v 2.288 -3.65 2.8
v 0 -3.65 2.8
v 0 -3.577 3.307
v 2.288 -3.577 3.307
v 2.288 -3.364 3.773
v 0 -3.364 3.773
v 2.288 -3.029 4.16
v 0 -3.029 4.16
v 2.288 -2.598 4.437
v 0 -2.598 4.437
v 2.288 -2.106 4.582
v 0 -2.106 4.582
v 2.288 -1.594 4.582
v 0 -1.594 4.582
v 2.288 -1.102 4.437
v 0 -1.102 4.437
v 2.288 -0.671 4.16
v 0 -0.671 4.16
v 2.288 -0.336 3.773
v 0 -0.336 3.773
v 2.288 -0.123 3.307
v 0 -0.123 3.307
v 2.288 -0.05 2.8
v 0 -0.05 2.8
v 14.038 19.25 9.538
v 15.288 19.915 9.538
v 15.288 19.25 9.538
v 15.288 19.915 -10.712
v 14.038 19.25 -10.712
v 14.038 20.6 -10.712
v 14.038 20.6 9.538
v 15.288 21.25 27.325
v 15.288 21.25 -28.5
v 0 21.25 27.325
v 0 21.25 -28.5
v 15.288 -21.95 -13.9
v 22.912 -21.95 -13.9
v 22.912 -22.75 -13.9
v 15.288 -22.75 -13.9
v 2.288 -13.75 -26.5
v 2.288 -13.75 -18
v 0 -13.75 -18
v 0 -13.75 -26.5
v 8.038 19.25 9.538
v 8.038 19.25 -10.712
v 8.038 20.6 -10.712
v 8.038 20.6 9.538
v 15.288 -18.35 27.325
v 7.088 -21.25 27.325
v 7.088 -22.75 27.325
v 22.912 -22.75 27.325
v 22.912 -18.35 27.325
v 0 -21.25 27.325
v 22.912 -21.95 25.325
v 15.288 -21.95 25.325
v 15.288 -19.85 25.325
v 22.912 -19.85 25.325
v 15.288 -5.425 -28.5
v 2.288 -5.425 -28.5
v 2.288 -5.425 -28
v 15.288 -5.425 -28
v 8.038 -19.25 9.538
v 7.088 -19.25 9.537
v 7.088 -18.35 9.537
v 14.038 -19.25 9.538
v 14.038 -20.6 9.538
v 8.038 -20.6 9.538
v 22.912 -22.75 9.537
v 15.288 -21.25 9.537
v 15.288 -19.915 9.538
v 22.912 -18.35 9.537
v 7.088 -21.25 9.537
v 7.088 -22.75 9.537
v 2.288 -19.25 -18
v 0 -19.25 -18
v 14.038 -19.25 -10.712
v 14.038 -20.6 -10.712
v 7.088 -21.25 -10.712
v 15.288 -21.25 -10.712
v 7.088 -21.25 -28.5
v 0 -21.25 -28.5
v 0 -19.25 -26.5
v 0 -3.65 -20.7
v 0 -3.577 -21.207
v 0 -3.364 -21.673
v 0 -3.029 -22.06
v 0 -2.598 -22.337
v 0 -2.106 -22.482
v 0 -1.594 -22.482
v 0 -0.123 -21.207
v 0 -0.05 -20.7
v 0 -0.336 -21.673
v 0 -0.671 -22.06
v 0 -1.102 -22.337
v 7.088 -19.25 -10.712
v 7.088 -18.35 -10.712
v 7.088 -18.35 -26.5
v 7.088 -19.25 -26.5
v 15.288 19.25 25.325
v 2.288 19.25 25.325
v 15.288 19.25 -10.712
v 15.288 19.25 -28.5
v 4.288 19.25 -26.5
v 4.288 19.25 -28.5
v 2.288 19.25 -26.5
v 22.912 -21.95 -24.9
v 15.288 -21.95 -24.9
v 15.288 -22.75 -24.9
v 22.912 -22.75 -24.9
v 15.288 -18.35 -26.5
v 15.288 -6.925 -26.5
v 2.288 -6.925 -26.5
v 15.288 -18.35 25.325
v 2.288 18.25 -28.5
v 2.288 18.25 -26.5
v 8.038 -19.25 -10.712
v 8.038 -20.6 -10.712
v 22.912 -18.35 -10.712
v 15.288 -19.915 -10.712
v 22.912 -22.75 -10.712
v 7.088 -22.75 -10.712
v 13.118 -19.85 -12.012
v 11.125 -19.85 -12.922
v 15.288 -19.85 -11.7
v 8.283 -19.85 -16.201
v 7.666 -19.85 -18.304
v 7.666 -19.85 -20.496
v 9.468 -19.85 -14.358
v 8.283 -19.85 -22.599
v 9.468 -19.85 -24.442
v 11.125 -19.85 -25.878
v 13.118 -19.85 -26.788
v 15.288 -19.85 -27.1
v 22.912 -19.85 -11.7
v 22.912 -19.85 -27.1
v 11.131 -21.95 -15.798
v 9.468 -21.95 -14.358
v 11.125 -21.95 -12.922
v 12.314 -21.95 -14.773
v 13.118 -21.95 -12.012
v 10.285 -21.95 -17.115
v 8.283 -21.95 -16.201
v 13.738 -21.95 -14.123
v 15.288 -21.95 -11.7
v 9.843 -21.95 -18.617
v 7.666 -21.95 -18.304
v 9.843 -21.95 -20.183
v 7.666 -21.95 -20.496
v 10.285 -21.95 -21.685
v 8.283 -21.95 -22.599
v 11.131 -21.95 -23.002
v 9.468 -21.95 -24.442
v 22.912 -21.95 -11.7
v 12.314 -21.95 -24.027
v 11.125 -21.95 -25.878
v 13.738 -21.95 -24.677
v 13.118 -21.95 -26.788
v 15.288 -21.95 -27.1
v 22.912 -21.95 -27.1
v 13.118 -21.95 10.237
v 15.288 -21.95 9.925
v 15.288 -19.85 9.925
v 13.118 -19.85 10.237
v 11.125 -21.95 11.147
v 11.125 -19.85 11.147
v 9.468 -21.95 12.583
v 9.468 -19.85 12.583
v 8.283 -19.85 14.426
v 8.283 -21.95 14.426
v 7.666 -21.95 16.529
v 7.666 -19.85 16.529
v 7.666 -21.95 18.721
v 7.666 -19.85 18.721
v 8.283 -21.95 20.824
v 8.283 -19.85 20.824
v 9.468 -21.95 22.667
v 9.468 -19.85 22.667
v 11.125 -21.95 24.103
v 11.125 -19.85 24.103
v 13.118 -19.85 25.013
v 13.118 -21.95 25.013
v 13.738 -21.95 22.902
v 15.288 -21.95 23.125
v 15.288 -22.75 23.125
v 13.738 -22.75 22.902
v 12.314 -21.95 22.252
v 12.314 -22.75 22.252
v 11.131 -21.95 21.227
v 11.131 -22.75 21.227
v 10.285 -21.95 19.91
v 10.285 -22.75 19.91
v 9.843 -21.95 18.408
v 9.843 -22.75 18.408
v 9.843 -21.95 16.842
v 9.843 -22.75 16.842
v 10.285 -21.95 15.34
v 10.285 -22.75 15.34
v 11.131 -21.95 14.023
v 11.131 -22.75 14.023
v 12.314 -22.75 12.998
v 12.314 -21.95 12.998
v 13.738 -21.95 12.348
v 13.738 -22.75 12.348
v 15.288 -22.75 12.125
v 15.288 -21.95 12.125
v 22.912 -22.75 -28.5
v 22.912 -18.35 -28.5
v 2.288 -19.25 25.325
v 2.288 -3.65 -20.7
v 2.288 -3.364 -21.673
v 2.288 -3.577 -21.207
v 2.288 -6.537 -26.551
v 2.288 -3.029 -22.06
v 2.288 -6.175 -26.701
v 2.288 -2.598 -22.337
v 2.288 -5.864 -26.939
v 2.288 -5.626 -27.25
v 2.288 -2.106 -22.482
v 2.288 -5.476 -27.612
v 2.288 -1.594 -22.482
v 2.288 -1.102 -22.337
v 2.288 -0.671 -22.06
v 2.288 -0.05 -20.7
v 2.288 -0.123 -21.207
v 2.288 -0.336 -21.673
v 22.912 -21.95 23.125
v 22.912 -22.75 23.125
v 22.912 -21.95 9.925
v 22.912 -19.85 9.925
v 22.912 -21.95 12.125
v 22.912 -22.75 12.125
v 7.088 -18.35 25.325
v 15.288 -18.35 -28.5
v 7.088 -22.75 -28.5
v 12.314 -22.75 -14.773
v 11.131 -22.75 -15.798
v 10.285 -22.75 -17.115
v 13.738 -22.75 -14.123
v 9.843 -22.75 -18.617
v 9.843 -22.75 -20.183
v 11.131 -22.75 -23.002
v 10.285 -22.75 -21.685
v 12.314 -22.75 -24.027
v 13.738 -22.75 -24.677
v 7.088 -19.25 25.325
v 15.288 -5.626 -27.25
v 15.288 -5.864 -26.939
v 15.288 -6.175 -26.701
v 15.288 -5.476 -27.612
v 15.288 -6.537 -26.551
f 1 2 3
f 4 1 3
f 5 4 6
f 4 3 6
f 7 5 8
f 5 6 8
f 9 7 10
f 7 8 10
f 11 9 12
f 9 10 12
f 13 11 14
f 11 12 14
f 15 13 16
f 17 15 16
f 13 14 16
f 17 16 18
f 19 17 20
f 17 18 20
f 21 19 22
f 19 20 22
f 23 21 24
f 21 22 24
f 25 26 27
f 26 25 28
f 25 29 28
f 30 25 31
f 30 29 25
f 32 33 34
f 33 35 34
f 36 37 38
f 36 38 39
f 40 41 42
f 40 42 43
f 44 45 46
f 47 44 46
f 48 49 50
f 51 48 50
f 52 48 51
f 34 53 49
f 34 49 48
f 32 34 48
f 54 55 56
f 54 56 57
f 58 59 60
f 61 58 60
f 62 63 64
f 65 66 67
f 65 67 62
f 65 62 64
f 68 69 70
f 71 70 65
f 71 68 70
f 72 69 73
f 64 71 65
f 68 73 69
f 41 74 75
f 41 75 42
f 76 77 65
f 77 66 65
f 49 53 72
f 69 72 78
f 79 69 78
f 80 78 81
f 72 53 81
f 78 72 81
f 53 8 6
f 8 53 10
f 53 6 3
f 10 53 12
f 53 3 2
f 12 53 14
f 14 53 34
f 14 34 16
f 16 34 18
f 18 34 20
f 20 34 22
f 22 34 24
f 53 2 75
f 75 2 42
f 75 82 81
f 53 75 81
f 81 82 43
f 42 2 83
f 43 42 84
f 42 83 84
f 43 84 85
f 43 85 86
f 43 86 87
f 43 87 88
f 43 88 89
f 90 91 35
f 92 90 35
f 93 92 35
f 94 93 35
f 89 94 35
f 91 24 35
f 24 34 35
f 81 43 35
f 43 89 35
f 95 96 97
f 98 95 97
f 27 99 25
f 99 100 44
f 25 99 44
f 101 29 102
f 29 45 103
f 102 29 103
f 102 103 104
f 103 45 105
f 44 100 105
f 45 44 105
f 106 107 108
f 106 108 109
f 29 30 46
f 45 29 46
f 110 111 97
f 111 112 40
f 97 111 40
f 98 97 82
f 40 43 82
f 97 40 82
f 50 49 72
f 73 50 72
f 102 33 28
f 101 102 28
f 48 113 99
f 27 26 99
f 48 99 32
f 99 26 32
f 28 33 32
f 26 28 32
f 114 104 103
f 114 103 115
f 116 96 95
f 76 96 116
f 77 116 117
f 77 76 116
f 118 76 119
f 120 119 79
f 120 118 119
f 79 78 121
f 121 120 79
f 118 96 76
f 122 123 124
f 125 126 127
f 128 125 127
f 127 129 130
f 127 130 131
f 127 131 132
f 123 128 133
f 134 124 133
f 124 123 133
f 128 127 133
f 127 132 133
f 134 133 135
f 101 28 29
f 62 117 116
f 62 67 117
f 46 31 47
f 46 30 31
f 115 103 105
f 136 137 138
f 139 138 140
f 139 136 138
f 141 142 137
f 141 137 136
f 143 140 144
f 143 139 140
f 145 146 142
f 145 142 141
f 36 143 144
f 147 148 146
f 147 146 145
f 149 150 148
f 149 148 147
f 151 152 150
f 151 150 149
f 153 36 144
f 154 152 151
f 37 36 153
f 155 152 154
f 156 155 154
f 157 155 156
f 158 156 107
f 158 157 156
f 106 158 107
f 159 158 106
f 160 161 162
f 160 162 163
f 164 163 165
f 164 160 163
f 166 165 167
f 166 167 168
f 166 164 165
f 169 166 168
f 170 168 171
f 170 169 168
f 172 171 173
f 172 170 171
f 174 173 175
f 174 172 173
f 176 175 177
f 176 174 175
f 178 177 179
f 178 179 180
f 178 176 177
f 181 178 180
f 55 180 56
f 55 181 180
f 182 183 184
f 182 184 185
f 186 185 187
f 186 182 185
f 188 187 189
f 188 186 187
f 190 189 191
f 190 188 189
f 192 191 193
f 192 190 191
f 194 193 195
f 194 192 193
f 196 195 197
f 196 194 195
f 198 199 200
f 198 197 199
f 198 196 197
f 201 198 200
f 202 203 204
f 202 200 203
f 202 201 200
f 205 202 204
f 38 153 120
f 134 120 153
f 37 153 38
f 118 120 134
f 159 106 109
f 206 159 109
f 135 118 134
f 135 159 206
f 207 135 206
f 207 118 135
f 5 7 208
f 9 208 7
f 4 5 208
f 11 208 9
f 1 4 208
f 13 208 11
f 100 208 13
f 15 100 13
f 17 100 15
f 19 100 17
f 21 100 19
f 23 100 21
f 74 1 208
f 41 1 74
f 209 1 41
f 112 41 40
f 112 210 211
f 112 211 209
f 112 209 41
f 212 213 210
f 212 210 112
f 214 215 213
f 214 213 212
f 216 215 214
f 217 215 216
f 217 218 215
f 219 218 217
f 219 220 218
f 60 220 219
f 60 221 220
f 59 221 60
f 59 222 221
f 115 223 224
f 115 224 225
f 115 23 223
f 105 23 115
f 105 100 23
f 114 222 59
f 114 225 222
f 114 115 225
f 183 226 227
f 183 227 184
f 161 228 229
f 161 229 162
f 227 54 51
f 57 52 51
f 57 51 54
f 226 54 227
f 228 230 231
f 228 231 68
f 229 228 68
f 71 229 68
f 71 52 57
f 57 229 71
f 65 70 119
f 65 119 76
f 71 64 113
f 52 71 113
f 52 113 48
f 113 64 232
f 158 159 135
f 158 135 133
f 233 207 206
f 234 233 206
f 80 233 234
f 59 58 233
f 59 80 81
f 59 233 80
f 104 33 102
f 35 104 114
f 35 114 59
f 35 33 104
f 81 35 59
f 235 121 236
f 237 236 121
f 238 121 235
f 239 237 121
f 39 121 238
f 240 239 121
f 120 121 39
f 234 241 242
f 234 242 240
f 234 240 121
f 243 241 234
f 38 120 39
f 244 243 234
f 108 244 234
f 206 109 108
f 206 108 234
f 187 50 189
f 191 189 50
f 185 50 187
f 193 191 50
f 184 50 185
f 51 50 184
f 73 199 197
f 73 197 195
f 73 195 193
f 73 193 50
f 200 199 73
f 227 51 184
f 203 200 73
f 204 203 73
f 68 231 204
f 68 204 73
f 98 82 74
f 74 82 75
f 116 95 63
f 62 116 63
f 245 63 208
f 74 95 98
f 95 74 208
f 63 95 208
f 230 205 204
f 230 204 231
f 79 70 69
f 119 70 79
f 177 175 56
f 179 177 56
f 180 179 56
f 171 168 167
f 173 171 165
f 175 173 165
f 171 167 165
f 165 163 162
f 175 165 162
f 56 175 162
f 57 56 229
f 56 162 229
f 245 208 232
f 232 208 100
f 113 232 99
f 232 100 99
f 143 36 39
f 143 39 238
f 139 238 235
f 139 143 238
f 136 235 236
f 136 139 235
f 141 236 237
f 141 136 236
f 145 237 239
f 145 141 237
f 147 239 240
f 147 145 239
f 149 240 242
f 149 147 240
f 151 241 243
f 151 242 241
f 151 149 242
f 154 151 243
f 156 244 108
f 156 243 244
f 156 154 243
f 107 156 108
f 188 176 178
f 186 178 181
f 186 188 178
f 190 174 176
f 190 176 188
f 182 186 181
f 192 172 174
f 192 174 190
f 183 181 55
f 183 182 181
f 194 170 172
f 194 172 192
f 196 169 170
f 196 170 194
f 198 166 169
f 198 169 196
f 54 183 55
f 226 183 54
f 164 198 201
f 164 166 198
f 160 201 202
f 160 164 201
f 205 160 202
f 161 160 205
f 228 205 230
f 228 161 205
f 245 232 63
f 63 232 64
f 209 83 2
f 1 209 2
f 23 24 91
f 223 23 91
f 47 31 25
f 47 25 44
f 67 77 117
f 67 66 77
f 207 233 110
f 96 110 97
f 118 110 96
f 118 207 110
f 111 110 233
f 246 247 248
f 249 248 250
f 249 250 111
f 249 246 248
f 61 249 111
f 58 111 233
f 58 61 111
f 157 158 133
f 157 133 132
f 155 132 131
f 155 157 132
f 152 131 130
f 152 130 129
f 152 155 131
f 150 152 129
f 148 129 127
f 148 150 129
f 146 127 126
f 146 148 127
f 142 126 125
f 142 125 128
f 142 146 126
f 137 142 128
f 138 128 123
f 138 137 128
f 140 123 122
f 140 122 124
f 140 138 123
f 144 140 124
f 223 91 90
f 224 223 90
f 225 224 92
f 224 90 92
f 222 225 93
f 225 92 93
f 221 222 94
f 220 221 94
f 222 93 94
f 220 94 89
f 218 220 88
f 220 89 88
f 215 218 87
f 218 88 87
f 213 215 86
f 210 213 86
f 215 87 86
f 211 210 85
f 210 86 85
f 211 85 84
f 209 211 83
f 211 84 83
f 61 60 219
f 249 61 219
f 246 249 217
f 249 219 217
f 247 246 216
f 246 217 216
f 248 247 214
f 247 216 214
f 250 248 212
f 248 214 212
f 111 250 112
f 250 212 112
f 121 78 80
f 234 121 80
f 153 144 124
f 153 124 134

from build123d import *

# Parameters (mm, degrees)
MAIN_EXTRUDE_DEPTH          = 2.2875
WALLS_START                 = 2.2875
WALLS_DEPTH                 = 13
CORNER_SUPPORT_DEPTH        = 2
FILLET4_R                   = 2
SKETCH4_W                   = 8.5
SKETCH4_H                   = 5.5
WIRE_HOLE_DEPTH             = 40.380356778
SKETCH25_W                  = 6
SKETCH25_H                  = 1.35
FEMALE_SNAP_DEPTH           = 10.125
SKETCH30_W                  = 15.7875
SKETCH30_H                  = 0.9
SKETCH30_W_2                = 17.7875
SKETCH30_H_2                = 1.5
MAGNET_EXTRUDE_1_DEPTH      = 7.625
MAGNET_EXTRUDE_1_DEPTH_BACK = 8.2
SKETCH29_R                  = 7.7
MAGNET_HOLE_DEPTH           = 2.1
SKETCH31_R                  = 5.5
MAGNET_THRU_HOLE_DEPTH      = 58.632218908
SKETCH40_W                  = 15.2875
SKETCH40_H                  = 12.55
CUT_EXTRUDE2_DEPTH          = 6
SKETCH41_W                  = 13
SKETCH41_H                  = 2
BOSS_EXTRUDE1_DEPTH         = 9.4


with BuildPart() as part:
    # Sketch1 → Main Extrude (new body)
    with BuildSketch(Plane(origin=(0, 0, 0), x_dir=(0, 0, -1), z_dir=(1, 0, 0))):
        Polygon((-30.5, -9.35), (-27.325, -9.35), (-27.325, -21.25), (28.5, -21.25), (28.5, 21.25), (-27.325, 21.25), (-27.325, 3.2), (-30.5, 3.2), align=None)
        with BuildLine():
            Line((20.7, -3.65), (-2.8, -3.65))
            ThreePointArc((-2.8, -3.65), (-4.6, -1.85), (-2.8, -0.05))
            Line((-2.8, -0.05), (20.7, -0.05))
            ThreePointArc((20.7, -0.05), (22.5, -1.85), (20.7, -3.65))
        make_face(mode=Mode.SUBTRACT)
    extrude(amount=MAIN_EXTRUDE_DEPTH)

    # Sketch1_3 → Walls (add)
    with BuildSketch(Plane(origin=(0, 0, 0), x_dir=(0, 0, -1), z_dir=(1, 0, 0)).offset(WALLS_START)):
        Polygon((-25.325, 19.25), (28.5, 19.25), (28.5, 21.25), (-27.325, 21.25), (-27.325, 3.2), (-30.5, 3.2), (-30.5, 1.3), (-25.325, 1.3), align=None)
        with BuildLine():
            Line((28.5, -5.425), (28, -5.425))
            ThreePointArc((28, -5.425), (26.939339828, -5.864339828), (26.5, -6.925))
            Line((26.5, -6.925), (26.5, -19.25))
            Line((26.5, -19.25), (-25.325, -19.25))
            Line((-25.325, -19.25), (-25.325, -8.1))
            Line((-25.325, -8.1), (-28.5, -8.1))
            Line((-28.5, -8.1), (-28.5, -4.45))
            Line((-28.5, -4.45), (-30.5, -4.45))
            Line((-30.5, -4.45), (-30.5, -9.35))
            Line((-30.5, -9.35), (-27.325, -9.35))
            Line((-27.325, -9.35), (-27.325, -21.25))
            Line((-27.325, -21.25), (28.5, -21.25))
            Line((28.5, -21.25), (28.5, -5.425))
        make_face()
    extrude(amount=WALLS_DEPTH)

    # Sketch22 → Corner Support (add)
    with BuildSketch(Plane(origin=(0, 0, -28.5), x_dir=(-1, 0, 0), z_dir=(0, 0, -1))):
        Polygon((-4.2875, 19.25), (-2.2875, 18.25), (-2.2875, 19.25), align=None)
    extrude(amount=-CORNER_SUPPORT_DEPTH)

    # Fillet4
    fillet4_edges = [part.edges().sort_by_distance(p)[0] for p in [
        (2.2875, -1.575, 30.5),
    ]]
    fillet(fillet4_edges, radius=FILLET4_R)

    # Sketch4 → Wire Hole (cut, through all)
    with BuildSketch(Plane(origin=(2.2875, 0, 0), x_dir=(0, 0, -1), z_dir=(1, 0, 0))):
        with Locations((22.25, -16.5)):
            Rectangle(SKETCH4_W, SKETCH4_H)
    extrude(amount=-WIRE_HOLE_DEPTH, mode=Mode.SUBTRACT)

    # Sketch25 → Female Snap (cut, symmetric)
    with BuildSketch(Plane(origin=(0, 0, -0.5875), x_dir=(-1, 0, 0), z_dir=(0, 0, -1))):
        with Locations((-11.0375, -19.925)):
            Rectangle(SKETCH25_W, SKETCH25_H)
        Polygon((-15.2875, -19.25), (-15.2875, -19.91463679), (-14.0375, -19.25), align=None)
        with Locations((-11.0375, 19.925)):
            Rectangle(SKETCH25_W, SKETCH25_H)
        Polygon((-15.2875, 19.91463679), (-15.2875, 19.25), (-14.0375, 19.25), align=None)
    extrude(amount=FEMALE_SNAP_DEPTH, both=True, mode=Mode.SUBTRACT)

    # Sketch30 → Magnet Extrude 1 (add, two sides)
    with BuildSketch(Plane(origin=(15.2875, 0, 0), x_dir=(0, 0, -1), z_dir=(1, 0, 0))) as magnet_extrude_1_sk:
        Polygon((-27.325, -18.35), (-27.325, -21.25), (-9.5375, -21.25), (-9.5375, -19.91463679), (-9.5375, -19.25), (-25.325, -19.25), (-25.325, -18.35), align=None)
        with Locations((-17.43125, -18.8)):
            Rectangle(SKETCH30_W, SKETCH30_H)
        with Locations((19.60625, -22)):
            Rectangle(SKETCH30_W_2, SKETCH30_H_2)
        Polygon((10.7125, -19.91463679), (10.7125, -21.25), (28.5, -21.25), (28.5, -18.35), (26.5, -18.35), (26.5, -19.25), (10.7125, -19.25), align=None)
        with Locations((-18.43125, -22)):
            Rectangle(SKETCH30_W_2, SKETCH30_H_2)
        with Locations((18.60625, -18.8)):
            Rectangle(SKETCH30_W, SKETCH30_H)
    extrude(amount=MAGNET_EXTRUDE_1_DEPTH)
    extrude(magnet_extrude_1_sk.sketch, amount=-MAGNET_EXTRUDE_1_DEPTH_BACK)

    # Sketch29 → Magnet Hole (cut)
    with BuildSketch(Plane(origin=(0, -21.95, 0), x_dir=(1, 0, 0), z_dir=(0, 1, 0))):
        with Locations((15.2875, -17.625)):
            Circle(SKETCH29_R)
        with BuildLine():
            ThreePointArc((22.9125, -18.697089082), (20.338980677, -23.436414885), (15.2875, -25.325))
            Line((15.2875, -25.325), (22.9125, -25.325))
            Line((22.9125, -25.325), (22.9125, -18.697089082))
        make_face()
        with BuildLine():
            Line((22.9125, -9.925), (15.2875, -9.925))
            ThreePointArc((15.2875, -9.925), (20.338980677, -11.813585115), (22.9125, -16.552910918))
            Line((22.9125, -16.552910918), (22.9125, -9.925))
        make_face()
        with Locations((15.2875, 19.4)):
            Circle(SKETCH29_R)
        with BuildLine():
            ThreePointArc((22.9125, 18.327910918), (20.338980677, 13.588585115), (15.2875, 11.7))
            Line((15.2875, 11.7), (22.9125, 11.7))
            Line((22.9125, 11.7), (22.9125, 18.327910918))
        make_face()
        with BuildLine():
            Line((22.9125, 27.1), (15.2875, 27.1))
            ThreePointArc((15.2875, 27.1), (20.338980677, 25.211414885), (22.9125, 20.472089082))
            Line((22.9125, 20.472089082), (22.9125, 27.1))
        make_face()
        with BuildLine():
            ThreePointArc((22.9875, -17.625), (22.968727116, -17.087645368), (22.9125, -16.552910918))
            Line((22.9125, -16.552910918), (22.9125, -18.697089082))
            ThreePointArc((22.9125, -18.697089082), (22.968727116, -18.162354632), (22.9875, -17.625))
        make_face()
        with BuildLine():
            Line((22.9125, 20.472089082), (22.9125, 18.327910918))
            ThreePointArc((22.9125, 18.327910918), (22.968727116, 18.862645368), (22.9875, 19.4))
            ThreePointArc((22.9875, 19.4), (22.968727116, 19.937354632), (22.9125, 20.472089082))
        make_face()
    extrude(amount=MAGNET_HOLE_DEPTH, mode=Mode.SUBTRACT)

    # Sketch31 → Magnet Thru Hole (cut, through all)
    with BuildSketch(Plane.XZ.offset(21.95)):
        with Locations((15.2875, 17.625)):
            Circle(SKETCH31_R)
        with BuildLine():
            Line((22.9125, 23.125), (15.2875, 23.125))
            ThreePointArc((15.2875, 23.125), (19.176587297, 21.514087297), (20.7875, 17.625))
            ThreePointArc((20.7875, 17.625), (19.176587297, 13.735912703), (15.2875, 12.125))
            Line((15.2875, 12.125), (22.9125, 12.125))
            Line((22.9125, 12.125), (22.9125, 23.125))
        make_face()
        with Locations((15.2875, -19.4)):
            Circle(SKETCH31_R)
        with BuildLine():
            Line((22.9125, -13.9), (15.2875, -13.9))
            ThreePointArc((15.2875, -13.9), (19.176587297, -15.510912703), (20.7875, -19.4))
            ThreePointArc((20.7875, -19.4), (19.176587297, -23.289087297), (15.2875, -24.9))
            Line((15.2875, -24.9), (22.9125, -24.9))
            Line((22.9125, -24.9), (22.9125, -13.9))
        make_face()
    extrude(amount=MAGNET_THRU_HOLE_DEPTH, mode=Mode.SUBTRACT)

    # Sketch40 → Cut-Extrude2 (cut)
    with BuildSketch(Plane.XY.offset(27.325)):
        with Locations((7.64375, -3.075)):
            Rectangle(SKETCH40_W, SKETCH40_H)
    extrude(amount=CUT_EXTRUDE2_DEPTH, mode=Mode.SUBTRACT)

    # Sketch41 → Boss-Extrude1 (add)
    with BuildSketch(Plane.XZ.offset(-1.3)):
        with Locations((8.7875, 26.325)):
            Rectangle(SKETCH41_W, SKETCH41_H)
    extrude(amount=BOSS_EXTRUDE1_DEPTH)


solid = part.part
